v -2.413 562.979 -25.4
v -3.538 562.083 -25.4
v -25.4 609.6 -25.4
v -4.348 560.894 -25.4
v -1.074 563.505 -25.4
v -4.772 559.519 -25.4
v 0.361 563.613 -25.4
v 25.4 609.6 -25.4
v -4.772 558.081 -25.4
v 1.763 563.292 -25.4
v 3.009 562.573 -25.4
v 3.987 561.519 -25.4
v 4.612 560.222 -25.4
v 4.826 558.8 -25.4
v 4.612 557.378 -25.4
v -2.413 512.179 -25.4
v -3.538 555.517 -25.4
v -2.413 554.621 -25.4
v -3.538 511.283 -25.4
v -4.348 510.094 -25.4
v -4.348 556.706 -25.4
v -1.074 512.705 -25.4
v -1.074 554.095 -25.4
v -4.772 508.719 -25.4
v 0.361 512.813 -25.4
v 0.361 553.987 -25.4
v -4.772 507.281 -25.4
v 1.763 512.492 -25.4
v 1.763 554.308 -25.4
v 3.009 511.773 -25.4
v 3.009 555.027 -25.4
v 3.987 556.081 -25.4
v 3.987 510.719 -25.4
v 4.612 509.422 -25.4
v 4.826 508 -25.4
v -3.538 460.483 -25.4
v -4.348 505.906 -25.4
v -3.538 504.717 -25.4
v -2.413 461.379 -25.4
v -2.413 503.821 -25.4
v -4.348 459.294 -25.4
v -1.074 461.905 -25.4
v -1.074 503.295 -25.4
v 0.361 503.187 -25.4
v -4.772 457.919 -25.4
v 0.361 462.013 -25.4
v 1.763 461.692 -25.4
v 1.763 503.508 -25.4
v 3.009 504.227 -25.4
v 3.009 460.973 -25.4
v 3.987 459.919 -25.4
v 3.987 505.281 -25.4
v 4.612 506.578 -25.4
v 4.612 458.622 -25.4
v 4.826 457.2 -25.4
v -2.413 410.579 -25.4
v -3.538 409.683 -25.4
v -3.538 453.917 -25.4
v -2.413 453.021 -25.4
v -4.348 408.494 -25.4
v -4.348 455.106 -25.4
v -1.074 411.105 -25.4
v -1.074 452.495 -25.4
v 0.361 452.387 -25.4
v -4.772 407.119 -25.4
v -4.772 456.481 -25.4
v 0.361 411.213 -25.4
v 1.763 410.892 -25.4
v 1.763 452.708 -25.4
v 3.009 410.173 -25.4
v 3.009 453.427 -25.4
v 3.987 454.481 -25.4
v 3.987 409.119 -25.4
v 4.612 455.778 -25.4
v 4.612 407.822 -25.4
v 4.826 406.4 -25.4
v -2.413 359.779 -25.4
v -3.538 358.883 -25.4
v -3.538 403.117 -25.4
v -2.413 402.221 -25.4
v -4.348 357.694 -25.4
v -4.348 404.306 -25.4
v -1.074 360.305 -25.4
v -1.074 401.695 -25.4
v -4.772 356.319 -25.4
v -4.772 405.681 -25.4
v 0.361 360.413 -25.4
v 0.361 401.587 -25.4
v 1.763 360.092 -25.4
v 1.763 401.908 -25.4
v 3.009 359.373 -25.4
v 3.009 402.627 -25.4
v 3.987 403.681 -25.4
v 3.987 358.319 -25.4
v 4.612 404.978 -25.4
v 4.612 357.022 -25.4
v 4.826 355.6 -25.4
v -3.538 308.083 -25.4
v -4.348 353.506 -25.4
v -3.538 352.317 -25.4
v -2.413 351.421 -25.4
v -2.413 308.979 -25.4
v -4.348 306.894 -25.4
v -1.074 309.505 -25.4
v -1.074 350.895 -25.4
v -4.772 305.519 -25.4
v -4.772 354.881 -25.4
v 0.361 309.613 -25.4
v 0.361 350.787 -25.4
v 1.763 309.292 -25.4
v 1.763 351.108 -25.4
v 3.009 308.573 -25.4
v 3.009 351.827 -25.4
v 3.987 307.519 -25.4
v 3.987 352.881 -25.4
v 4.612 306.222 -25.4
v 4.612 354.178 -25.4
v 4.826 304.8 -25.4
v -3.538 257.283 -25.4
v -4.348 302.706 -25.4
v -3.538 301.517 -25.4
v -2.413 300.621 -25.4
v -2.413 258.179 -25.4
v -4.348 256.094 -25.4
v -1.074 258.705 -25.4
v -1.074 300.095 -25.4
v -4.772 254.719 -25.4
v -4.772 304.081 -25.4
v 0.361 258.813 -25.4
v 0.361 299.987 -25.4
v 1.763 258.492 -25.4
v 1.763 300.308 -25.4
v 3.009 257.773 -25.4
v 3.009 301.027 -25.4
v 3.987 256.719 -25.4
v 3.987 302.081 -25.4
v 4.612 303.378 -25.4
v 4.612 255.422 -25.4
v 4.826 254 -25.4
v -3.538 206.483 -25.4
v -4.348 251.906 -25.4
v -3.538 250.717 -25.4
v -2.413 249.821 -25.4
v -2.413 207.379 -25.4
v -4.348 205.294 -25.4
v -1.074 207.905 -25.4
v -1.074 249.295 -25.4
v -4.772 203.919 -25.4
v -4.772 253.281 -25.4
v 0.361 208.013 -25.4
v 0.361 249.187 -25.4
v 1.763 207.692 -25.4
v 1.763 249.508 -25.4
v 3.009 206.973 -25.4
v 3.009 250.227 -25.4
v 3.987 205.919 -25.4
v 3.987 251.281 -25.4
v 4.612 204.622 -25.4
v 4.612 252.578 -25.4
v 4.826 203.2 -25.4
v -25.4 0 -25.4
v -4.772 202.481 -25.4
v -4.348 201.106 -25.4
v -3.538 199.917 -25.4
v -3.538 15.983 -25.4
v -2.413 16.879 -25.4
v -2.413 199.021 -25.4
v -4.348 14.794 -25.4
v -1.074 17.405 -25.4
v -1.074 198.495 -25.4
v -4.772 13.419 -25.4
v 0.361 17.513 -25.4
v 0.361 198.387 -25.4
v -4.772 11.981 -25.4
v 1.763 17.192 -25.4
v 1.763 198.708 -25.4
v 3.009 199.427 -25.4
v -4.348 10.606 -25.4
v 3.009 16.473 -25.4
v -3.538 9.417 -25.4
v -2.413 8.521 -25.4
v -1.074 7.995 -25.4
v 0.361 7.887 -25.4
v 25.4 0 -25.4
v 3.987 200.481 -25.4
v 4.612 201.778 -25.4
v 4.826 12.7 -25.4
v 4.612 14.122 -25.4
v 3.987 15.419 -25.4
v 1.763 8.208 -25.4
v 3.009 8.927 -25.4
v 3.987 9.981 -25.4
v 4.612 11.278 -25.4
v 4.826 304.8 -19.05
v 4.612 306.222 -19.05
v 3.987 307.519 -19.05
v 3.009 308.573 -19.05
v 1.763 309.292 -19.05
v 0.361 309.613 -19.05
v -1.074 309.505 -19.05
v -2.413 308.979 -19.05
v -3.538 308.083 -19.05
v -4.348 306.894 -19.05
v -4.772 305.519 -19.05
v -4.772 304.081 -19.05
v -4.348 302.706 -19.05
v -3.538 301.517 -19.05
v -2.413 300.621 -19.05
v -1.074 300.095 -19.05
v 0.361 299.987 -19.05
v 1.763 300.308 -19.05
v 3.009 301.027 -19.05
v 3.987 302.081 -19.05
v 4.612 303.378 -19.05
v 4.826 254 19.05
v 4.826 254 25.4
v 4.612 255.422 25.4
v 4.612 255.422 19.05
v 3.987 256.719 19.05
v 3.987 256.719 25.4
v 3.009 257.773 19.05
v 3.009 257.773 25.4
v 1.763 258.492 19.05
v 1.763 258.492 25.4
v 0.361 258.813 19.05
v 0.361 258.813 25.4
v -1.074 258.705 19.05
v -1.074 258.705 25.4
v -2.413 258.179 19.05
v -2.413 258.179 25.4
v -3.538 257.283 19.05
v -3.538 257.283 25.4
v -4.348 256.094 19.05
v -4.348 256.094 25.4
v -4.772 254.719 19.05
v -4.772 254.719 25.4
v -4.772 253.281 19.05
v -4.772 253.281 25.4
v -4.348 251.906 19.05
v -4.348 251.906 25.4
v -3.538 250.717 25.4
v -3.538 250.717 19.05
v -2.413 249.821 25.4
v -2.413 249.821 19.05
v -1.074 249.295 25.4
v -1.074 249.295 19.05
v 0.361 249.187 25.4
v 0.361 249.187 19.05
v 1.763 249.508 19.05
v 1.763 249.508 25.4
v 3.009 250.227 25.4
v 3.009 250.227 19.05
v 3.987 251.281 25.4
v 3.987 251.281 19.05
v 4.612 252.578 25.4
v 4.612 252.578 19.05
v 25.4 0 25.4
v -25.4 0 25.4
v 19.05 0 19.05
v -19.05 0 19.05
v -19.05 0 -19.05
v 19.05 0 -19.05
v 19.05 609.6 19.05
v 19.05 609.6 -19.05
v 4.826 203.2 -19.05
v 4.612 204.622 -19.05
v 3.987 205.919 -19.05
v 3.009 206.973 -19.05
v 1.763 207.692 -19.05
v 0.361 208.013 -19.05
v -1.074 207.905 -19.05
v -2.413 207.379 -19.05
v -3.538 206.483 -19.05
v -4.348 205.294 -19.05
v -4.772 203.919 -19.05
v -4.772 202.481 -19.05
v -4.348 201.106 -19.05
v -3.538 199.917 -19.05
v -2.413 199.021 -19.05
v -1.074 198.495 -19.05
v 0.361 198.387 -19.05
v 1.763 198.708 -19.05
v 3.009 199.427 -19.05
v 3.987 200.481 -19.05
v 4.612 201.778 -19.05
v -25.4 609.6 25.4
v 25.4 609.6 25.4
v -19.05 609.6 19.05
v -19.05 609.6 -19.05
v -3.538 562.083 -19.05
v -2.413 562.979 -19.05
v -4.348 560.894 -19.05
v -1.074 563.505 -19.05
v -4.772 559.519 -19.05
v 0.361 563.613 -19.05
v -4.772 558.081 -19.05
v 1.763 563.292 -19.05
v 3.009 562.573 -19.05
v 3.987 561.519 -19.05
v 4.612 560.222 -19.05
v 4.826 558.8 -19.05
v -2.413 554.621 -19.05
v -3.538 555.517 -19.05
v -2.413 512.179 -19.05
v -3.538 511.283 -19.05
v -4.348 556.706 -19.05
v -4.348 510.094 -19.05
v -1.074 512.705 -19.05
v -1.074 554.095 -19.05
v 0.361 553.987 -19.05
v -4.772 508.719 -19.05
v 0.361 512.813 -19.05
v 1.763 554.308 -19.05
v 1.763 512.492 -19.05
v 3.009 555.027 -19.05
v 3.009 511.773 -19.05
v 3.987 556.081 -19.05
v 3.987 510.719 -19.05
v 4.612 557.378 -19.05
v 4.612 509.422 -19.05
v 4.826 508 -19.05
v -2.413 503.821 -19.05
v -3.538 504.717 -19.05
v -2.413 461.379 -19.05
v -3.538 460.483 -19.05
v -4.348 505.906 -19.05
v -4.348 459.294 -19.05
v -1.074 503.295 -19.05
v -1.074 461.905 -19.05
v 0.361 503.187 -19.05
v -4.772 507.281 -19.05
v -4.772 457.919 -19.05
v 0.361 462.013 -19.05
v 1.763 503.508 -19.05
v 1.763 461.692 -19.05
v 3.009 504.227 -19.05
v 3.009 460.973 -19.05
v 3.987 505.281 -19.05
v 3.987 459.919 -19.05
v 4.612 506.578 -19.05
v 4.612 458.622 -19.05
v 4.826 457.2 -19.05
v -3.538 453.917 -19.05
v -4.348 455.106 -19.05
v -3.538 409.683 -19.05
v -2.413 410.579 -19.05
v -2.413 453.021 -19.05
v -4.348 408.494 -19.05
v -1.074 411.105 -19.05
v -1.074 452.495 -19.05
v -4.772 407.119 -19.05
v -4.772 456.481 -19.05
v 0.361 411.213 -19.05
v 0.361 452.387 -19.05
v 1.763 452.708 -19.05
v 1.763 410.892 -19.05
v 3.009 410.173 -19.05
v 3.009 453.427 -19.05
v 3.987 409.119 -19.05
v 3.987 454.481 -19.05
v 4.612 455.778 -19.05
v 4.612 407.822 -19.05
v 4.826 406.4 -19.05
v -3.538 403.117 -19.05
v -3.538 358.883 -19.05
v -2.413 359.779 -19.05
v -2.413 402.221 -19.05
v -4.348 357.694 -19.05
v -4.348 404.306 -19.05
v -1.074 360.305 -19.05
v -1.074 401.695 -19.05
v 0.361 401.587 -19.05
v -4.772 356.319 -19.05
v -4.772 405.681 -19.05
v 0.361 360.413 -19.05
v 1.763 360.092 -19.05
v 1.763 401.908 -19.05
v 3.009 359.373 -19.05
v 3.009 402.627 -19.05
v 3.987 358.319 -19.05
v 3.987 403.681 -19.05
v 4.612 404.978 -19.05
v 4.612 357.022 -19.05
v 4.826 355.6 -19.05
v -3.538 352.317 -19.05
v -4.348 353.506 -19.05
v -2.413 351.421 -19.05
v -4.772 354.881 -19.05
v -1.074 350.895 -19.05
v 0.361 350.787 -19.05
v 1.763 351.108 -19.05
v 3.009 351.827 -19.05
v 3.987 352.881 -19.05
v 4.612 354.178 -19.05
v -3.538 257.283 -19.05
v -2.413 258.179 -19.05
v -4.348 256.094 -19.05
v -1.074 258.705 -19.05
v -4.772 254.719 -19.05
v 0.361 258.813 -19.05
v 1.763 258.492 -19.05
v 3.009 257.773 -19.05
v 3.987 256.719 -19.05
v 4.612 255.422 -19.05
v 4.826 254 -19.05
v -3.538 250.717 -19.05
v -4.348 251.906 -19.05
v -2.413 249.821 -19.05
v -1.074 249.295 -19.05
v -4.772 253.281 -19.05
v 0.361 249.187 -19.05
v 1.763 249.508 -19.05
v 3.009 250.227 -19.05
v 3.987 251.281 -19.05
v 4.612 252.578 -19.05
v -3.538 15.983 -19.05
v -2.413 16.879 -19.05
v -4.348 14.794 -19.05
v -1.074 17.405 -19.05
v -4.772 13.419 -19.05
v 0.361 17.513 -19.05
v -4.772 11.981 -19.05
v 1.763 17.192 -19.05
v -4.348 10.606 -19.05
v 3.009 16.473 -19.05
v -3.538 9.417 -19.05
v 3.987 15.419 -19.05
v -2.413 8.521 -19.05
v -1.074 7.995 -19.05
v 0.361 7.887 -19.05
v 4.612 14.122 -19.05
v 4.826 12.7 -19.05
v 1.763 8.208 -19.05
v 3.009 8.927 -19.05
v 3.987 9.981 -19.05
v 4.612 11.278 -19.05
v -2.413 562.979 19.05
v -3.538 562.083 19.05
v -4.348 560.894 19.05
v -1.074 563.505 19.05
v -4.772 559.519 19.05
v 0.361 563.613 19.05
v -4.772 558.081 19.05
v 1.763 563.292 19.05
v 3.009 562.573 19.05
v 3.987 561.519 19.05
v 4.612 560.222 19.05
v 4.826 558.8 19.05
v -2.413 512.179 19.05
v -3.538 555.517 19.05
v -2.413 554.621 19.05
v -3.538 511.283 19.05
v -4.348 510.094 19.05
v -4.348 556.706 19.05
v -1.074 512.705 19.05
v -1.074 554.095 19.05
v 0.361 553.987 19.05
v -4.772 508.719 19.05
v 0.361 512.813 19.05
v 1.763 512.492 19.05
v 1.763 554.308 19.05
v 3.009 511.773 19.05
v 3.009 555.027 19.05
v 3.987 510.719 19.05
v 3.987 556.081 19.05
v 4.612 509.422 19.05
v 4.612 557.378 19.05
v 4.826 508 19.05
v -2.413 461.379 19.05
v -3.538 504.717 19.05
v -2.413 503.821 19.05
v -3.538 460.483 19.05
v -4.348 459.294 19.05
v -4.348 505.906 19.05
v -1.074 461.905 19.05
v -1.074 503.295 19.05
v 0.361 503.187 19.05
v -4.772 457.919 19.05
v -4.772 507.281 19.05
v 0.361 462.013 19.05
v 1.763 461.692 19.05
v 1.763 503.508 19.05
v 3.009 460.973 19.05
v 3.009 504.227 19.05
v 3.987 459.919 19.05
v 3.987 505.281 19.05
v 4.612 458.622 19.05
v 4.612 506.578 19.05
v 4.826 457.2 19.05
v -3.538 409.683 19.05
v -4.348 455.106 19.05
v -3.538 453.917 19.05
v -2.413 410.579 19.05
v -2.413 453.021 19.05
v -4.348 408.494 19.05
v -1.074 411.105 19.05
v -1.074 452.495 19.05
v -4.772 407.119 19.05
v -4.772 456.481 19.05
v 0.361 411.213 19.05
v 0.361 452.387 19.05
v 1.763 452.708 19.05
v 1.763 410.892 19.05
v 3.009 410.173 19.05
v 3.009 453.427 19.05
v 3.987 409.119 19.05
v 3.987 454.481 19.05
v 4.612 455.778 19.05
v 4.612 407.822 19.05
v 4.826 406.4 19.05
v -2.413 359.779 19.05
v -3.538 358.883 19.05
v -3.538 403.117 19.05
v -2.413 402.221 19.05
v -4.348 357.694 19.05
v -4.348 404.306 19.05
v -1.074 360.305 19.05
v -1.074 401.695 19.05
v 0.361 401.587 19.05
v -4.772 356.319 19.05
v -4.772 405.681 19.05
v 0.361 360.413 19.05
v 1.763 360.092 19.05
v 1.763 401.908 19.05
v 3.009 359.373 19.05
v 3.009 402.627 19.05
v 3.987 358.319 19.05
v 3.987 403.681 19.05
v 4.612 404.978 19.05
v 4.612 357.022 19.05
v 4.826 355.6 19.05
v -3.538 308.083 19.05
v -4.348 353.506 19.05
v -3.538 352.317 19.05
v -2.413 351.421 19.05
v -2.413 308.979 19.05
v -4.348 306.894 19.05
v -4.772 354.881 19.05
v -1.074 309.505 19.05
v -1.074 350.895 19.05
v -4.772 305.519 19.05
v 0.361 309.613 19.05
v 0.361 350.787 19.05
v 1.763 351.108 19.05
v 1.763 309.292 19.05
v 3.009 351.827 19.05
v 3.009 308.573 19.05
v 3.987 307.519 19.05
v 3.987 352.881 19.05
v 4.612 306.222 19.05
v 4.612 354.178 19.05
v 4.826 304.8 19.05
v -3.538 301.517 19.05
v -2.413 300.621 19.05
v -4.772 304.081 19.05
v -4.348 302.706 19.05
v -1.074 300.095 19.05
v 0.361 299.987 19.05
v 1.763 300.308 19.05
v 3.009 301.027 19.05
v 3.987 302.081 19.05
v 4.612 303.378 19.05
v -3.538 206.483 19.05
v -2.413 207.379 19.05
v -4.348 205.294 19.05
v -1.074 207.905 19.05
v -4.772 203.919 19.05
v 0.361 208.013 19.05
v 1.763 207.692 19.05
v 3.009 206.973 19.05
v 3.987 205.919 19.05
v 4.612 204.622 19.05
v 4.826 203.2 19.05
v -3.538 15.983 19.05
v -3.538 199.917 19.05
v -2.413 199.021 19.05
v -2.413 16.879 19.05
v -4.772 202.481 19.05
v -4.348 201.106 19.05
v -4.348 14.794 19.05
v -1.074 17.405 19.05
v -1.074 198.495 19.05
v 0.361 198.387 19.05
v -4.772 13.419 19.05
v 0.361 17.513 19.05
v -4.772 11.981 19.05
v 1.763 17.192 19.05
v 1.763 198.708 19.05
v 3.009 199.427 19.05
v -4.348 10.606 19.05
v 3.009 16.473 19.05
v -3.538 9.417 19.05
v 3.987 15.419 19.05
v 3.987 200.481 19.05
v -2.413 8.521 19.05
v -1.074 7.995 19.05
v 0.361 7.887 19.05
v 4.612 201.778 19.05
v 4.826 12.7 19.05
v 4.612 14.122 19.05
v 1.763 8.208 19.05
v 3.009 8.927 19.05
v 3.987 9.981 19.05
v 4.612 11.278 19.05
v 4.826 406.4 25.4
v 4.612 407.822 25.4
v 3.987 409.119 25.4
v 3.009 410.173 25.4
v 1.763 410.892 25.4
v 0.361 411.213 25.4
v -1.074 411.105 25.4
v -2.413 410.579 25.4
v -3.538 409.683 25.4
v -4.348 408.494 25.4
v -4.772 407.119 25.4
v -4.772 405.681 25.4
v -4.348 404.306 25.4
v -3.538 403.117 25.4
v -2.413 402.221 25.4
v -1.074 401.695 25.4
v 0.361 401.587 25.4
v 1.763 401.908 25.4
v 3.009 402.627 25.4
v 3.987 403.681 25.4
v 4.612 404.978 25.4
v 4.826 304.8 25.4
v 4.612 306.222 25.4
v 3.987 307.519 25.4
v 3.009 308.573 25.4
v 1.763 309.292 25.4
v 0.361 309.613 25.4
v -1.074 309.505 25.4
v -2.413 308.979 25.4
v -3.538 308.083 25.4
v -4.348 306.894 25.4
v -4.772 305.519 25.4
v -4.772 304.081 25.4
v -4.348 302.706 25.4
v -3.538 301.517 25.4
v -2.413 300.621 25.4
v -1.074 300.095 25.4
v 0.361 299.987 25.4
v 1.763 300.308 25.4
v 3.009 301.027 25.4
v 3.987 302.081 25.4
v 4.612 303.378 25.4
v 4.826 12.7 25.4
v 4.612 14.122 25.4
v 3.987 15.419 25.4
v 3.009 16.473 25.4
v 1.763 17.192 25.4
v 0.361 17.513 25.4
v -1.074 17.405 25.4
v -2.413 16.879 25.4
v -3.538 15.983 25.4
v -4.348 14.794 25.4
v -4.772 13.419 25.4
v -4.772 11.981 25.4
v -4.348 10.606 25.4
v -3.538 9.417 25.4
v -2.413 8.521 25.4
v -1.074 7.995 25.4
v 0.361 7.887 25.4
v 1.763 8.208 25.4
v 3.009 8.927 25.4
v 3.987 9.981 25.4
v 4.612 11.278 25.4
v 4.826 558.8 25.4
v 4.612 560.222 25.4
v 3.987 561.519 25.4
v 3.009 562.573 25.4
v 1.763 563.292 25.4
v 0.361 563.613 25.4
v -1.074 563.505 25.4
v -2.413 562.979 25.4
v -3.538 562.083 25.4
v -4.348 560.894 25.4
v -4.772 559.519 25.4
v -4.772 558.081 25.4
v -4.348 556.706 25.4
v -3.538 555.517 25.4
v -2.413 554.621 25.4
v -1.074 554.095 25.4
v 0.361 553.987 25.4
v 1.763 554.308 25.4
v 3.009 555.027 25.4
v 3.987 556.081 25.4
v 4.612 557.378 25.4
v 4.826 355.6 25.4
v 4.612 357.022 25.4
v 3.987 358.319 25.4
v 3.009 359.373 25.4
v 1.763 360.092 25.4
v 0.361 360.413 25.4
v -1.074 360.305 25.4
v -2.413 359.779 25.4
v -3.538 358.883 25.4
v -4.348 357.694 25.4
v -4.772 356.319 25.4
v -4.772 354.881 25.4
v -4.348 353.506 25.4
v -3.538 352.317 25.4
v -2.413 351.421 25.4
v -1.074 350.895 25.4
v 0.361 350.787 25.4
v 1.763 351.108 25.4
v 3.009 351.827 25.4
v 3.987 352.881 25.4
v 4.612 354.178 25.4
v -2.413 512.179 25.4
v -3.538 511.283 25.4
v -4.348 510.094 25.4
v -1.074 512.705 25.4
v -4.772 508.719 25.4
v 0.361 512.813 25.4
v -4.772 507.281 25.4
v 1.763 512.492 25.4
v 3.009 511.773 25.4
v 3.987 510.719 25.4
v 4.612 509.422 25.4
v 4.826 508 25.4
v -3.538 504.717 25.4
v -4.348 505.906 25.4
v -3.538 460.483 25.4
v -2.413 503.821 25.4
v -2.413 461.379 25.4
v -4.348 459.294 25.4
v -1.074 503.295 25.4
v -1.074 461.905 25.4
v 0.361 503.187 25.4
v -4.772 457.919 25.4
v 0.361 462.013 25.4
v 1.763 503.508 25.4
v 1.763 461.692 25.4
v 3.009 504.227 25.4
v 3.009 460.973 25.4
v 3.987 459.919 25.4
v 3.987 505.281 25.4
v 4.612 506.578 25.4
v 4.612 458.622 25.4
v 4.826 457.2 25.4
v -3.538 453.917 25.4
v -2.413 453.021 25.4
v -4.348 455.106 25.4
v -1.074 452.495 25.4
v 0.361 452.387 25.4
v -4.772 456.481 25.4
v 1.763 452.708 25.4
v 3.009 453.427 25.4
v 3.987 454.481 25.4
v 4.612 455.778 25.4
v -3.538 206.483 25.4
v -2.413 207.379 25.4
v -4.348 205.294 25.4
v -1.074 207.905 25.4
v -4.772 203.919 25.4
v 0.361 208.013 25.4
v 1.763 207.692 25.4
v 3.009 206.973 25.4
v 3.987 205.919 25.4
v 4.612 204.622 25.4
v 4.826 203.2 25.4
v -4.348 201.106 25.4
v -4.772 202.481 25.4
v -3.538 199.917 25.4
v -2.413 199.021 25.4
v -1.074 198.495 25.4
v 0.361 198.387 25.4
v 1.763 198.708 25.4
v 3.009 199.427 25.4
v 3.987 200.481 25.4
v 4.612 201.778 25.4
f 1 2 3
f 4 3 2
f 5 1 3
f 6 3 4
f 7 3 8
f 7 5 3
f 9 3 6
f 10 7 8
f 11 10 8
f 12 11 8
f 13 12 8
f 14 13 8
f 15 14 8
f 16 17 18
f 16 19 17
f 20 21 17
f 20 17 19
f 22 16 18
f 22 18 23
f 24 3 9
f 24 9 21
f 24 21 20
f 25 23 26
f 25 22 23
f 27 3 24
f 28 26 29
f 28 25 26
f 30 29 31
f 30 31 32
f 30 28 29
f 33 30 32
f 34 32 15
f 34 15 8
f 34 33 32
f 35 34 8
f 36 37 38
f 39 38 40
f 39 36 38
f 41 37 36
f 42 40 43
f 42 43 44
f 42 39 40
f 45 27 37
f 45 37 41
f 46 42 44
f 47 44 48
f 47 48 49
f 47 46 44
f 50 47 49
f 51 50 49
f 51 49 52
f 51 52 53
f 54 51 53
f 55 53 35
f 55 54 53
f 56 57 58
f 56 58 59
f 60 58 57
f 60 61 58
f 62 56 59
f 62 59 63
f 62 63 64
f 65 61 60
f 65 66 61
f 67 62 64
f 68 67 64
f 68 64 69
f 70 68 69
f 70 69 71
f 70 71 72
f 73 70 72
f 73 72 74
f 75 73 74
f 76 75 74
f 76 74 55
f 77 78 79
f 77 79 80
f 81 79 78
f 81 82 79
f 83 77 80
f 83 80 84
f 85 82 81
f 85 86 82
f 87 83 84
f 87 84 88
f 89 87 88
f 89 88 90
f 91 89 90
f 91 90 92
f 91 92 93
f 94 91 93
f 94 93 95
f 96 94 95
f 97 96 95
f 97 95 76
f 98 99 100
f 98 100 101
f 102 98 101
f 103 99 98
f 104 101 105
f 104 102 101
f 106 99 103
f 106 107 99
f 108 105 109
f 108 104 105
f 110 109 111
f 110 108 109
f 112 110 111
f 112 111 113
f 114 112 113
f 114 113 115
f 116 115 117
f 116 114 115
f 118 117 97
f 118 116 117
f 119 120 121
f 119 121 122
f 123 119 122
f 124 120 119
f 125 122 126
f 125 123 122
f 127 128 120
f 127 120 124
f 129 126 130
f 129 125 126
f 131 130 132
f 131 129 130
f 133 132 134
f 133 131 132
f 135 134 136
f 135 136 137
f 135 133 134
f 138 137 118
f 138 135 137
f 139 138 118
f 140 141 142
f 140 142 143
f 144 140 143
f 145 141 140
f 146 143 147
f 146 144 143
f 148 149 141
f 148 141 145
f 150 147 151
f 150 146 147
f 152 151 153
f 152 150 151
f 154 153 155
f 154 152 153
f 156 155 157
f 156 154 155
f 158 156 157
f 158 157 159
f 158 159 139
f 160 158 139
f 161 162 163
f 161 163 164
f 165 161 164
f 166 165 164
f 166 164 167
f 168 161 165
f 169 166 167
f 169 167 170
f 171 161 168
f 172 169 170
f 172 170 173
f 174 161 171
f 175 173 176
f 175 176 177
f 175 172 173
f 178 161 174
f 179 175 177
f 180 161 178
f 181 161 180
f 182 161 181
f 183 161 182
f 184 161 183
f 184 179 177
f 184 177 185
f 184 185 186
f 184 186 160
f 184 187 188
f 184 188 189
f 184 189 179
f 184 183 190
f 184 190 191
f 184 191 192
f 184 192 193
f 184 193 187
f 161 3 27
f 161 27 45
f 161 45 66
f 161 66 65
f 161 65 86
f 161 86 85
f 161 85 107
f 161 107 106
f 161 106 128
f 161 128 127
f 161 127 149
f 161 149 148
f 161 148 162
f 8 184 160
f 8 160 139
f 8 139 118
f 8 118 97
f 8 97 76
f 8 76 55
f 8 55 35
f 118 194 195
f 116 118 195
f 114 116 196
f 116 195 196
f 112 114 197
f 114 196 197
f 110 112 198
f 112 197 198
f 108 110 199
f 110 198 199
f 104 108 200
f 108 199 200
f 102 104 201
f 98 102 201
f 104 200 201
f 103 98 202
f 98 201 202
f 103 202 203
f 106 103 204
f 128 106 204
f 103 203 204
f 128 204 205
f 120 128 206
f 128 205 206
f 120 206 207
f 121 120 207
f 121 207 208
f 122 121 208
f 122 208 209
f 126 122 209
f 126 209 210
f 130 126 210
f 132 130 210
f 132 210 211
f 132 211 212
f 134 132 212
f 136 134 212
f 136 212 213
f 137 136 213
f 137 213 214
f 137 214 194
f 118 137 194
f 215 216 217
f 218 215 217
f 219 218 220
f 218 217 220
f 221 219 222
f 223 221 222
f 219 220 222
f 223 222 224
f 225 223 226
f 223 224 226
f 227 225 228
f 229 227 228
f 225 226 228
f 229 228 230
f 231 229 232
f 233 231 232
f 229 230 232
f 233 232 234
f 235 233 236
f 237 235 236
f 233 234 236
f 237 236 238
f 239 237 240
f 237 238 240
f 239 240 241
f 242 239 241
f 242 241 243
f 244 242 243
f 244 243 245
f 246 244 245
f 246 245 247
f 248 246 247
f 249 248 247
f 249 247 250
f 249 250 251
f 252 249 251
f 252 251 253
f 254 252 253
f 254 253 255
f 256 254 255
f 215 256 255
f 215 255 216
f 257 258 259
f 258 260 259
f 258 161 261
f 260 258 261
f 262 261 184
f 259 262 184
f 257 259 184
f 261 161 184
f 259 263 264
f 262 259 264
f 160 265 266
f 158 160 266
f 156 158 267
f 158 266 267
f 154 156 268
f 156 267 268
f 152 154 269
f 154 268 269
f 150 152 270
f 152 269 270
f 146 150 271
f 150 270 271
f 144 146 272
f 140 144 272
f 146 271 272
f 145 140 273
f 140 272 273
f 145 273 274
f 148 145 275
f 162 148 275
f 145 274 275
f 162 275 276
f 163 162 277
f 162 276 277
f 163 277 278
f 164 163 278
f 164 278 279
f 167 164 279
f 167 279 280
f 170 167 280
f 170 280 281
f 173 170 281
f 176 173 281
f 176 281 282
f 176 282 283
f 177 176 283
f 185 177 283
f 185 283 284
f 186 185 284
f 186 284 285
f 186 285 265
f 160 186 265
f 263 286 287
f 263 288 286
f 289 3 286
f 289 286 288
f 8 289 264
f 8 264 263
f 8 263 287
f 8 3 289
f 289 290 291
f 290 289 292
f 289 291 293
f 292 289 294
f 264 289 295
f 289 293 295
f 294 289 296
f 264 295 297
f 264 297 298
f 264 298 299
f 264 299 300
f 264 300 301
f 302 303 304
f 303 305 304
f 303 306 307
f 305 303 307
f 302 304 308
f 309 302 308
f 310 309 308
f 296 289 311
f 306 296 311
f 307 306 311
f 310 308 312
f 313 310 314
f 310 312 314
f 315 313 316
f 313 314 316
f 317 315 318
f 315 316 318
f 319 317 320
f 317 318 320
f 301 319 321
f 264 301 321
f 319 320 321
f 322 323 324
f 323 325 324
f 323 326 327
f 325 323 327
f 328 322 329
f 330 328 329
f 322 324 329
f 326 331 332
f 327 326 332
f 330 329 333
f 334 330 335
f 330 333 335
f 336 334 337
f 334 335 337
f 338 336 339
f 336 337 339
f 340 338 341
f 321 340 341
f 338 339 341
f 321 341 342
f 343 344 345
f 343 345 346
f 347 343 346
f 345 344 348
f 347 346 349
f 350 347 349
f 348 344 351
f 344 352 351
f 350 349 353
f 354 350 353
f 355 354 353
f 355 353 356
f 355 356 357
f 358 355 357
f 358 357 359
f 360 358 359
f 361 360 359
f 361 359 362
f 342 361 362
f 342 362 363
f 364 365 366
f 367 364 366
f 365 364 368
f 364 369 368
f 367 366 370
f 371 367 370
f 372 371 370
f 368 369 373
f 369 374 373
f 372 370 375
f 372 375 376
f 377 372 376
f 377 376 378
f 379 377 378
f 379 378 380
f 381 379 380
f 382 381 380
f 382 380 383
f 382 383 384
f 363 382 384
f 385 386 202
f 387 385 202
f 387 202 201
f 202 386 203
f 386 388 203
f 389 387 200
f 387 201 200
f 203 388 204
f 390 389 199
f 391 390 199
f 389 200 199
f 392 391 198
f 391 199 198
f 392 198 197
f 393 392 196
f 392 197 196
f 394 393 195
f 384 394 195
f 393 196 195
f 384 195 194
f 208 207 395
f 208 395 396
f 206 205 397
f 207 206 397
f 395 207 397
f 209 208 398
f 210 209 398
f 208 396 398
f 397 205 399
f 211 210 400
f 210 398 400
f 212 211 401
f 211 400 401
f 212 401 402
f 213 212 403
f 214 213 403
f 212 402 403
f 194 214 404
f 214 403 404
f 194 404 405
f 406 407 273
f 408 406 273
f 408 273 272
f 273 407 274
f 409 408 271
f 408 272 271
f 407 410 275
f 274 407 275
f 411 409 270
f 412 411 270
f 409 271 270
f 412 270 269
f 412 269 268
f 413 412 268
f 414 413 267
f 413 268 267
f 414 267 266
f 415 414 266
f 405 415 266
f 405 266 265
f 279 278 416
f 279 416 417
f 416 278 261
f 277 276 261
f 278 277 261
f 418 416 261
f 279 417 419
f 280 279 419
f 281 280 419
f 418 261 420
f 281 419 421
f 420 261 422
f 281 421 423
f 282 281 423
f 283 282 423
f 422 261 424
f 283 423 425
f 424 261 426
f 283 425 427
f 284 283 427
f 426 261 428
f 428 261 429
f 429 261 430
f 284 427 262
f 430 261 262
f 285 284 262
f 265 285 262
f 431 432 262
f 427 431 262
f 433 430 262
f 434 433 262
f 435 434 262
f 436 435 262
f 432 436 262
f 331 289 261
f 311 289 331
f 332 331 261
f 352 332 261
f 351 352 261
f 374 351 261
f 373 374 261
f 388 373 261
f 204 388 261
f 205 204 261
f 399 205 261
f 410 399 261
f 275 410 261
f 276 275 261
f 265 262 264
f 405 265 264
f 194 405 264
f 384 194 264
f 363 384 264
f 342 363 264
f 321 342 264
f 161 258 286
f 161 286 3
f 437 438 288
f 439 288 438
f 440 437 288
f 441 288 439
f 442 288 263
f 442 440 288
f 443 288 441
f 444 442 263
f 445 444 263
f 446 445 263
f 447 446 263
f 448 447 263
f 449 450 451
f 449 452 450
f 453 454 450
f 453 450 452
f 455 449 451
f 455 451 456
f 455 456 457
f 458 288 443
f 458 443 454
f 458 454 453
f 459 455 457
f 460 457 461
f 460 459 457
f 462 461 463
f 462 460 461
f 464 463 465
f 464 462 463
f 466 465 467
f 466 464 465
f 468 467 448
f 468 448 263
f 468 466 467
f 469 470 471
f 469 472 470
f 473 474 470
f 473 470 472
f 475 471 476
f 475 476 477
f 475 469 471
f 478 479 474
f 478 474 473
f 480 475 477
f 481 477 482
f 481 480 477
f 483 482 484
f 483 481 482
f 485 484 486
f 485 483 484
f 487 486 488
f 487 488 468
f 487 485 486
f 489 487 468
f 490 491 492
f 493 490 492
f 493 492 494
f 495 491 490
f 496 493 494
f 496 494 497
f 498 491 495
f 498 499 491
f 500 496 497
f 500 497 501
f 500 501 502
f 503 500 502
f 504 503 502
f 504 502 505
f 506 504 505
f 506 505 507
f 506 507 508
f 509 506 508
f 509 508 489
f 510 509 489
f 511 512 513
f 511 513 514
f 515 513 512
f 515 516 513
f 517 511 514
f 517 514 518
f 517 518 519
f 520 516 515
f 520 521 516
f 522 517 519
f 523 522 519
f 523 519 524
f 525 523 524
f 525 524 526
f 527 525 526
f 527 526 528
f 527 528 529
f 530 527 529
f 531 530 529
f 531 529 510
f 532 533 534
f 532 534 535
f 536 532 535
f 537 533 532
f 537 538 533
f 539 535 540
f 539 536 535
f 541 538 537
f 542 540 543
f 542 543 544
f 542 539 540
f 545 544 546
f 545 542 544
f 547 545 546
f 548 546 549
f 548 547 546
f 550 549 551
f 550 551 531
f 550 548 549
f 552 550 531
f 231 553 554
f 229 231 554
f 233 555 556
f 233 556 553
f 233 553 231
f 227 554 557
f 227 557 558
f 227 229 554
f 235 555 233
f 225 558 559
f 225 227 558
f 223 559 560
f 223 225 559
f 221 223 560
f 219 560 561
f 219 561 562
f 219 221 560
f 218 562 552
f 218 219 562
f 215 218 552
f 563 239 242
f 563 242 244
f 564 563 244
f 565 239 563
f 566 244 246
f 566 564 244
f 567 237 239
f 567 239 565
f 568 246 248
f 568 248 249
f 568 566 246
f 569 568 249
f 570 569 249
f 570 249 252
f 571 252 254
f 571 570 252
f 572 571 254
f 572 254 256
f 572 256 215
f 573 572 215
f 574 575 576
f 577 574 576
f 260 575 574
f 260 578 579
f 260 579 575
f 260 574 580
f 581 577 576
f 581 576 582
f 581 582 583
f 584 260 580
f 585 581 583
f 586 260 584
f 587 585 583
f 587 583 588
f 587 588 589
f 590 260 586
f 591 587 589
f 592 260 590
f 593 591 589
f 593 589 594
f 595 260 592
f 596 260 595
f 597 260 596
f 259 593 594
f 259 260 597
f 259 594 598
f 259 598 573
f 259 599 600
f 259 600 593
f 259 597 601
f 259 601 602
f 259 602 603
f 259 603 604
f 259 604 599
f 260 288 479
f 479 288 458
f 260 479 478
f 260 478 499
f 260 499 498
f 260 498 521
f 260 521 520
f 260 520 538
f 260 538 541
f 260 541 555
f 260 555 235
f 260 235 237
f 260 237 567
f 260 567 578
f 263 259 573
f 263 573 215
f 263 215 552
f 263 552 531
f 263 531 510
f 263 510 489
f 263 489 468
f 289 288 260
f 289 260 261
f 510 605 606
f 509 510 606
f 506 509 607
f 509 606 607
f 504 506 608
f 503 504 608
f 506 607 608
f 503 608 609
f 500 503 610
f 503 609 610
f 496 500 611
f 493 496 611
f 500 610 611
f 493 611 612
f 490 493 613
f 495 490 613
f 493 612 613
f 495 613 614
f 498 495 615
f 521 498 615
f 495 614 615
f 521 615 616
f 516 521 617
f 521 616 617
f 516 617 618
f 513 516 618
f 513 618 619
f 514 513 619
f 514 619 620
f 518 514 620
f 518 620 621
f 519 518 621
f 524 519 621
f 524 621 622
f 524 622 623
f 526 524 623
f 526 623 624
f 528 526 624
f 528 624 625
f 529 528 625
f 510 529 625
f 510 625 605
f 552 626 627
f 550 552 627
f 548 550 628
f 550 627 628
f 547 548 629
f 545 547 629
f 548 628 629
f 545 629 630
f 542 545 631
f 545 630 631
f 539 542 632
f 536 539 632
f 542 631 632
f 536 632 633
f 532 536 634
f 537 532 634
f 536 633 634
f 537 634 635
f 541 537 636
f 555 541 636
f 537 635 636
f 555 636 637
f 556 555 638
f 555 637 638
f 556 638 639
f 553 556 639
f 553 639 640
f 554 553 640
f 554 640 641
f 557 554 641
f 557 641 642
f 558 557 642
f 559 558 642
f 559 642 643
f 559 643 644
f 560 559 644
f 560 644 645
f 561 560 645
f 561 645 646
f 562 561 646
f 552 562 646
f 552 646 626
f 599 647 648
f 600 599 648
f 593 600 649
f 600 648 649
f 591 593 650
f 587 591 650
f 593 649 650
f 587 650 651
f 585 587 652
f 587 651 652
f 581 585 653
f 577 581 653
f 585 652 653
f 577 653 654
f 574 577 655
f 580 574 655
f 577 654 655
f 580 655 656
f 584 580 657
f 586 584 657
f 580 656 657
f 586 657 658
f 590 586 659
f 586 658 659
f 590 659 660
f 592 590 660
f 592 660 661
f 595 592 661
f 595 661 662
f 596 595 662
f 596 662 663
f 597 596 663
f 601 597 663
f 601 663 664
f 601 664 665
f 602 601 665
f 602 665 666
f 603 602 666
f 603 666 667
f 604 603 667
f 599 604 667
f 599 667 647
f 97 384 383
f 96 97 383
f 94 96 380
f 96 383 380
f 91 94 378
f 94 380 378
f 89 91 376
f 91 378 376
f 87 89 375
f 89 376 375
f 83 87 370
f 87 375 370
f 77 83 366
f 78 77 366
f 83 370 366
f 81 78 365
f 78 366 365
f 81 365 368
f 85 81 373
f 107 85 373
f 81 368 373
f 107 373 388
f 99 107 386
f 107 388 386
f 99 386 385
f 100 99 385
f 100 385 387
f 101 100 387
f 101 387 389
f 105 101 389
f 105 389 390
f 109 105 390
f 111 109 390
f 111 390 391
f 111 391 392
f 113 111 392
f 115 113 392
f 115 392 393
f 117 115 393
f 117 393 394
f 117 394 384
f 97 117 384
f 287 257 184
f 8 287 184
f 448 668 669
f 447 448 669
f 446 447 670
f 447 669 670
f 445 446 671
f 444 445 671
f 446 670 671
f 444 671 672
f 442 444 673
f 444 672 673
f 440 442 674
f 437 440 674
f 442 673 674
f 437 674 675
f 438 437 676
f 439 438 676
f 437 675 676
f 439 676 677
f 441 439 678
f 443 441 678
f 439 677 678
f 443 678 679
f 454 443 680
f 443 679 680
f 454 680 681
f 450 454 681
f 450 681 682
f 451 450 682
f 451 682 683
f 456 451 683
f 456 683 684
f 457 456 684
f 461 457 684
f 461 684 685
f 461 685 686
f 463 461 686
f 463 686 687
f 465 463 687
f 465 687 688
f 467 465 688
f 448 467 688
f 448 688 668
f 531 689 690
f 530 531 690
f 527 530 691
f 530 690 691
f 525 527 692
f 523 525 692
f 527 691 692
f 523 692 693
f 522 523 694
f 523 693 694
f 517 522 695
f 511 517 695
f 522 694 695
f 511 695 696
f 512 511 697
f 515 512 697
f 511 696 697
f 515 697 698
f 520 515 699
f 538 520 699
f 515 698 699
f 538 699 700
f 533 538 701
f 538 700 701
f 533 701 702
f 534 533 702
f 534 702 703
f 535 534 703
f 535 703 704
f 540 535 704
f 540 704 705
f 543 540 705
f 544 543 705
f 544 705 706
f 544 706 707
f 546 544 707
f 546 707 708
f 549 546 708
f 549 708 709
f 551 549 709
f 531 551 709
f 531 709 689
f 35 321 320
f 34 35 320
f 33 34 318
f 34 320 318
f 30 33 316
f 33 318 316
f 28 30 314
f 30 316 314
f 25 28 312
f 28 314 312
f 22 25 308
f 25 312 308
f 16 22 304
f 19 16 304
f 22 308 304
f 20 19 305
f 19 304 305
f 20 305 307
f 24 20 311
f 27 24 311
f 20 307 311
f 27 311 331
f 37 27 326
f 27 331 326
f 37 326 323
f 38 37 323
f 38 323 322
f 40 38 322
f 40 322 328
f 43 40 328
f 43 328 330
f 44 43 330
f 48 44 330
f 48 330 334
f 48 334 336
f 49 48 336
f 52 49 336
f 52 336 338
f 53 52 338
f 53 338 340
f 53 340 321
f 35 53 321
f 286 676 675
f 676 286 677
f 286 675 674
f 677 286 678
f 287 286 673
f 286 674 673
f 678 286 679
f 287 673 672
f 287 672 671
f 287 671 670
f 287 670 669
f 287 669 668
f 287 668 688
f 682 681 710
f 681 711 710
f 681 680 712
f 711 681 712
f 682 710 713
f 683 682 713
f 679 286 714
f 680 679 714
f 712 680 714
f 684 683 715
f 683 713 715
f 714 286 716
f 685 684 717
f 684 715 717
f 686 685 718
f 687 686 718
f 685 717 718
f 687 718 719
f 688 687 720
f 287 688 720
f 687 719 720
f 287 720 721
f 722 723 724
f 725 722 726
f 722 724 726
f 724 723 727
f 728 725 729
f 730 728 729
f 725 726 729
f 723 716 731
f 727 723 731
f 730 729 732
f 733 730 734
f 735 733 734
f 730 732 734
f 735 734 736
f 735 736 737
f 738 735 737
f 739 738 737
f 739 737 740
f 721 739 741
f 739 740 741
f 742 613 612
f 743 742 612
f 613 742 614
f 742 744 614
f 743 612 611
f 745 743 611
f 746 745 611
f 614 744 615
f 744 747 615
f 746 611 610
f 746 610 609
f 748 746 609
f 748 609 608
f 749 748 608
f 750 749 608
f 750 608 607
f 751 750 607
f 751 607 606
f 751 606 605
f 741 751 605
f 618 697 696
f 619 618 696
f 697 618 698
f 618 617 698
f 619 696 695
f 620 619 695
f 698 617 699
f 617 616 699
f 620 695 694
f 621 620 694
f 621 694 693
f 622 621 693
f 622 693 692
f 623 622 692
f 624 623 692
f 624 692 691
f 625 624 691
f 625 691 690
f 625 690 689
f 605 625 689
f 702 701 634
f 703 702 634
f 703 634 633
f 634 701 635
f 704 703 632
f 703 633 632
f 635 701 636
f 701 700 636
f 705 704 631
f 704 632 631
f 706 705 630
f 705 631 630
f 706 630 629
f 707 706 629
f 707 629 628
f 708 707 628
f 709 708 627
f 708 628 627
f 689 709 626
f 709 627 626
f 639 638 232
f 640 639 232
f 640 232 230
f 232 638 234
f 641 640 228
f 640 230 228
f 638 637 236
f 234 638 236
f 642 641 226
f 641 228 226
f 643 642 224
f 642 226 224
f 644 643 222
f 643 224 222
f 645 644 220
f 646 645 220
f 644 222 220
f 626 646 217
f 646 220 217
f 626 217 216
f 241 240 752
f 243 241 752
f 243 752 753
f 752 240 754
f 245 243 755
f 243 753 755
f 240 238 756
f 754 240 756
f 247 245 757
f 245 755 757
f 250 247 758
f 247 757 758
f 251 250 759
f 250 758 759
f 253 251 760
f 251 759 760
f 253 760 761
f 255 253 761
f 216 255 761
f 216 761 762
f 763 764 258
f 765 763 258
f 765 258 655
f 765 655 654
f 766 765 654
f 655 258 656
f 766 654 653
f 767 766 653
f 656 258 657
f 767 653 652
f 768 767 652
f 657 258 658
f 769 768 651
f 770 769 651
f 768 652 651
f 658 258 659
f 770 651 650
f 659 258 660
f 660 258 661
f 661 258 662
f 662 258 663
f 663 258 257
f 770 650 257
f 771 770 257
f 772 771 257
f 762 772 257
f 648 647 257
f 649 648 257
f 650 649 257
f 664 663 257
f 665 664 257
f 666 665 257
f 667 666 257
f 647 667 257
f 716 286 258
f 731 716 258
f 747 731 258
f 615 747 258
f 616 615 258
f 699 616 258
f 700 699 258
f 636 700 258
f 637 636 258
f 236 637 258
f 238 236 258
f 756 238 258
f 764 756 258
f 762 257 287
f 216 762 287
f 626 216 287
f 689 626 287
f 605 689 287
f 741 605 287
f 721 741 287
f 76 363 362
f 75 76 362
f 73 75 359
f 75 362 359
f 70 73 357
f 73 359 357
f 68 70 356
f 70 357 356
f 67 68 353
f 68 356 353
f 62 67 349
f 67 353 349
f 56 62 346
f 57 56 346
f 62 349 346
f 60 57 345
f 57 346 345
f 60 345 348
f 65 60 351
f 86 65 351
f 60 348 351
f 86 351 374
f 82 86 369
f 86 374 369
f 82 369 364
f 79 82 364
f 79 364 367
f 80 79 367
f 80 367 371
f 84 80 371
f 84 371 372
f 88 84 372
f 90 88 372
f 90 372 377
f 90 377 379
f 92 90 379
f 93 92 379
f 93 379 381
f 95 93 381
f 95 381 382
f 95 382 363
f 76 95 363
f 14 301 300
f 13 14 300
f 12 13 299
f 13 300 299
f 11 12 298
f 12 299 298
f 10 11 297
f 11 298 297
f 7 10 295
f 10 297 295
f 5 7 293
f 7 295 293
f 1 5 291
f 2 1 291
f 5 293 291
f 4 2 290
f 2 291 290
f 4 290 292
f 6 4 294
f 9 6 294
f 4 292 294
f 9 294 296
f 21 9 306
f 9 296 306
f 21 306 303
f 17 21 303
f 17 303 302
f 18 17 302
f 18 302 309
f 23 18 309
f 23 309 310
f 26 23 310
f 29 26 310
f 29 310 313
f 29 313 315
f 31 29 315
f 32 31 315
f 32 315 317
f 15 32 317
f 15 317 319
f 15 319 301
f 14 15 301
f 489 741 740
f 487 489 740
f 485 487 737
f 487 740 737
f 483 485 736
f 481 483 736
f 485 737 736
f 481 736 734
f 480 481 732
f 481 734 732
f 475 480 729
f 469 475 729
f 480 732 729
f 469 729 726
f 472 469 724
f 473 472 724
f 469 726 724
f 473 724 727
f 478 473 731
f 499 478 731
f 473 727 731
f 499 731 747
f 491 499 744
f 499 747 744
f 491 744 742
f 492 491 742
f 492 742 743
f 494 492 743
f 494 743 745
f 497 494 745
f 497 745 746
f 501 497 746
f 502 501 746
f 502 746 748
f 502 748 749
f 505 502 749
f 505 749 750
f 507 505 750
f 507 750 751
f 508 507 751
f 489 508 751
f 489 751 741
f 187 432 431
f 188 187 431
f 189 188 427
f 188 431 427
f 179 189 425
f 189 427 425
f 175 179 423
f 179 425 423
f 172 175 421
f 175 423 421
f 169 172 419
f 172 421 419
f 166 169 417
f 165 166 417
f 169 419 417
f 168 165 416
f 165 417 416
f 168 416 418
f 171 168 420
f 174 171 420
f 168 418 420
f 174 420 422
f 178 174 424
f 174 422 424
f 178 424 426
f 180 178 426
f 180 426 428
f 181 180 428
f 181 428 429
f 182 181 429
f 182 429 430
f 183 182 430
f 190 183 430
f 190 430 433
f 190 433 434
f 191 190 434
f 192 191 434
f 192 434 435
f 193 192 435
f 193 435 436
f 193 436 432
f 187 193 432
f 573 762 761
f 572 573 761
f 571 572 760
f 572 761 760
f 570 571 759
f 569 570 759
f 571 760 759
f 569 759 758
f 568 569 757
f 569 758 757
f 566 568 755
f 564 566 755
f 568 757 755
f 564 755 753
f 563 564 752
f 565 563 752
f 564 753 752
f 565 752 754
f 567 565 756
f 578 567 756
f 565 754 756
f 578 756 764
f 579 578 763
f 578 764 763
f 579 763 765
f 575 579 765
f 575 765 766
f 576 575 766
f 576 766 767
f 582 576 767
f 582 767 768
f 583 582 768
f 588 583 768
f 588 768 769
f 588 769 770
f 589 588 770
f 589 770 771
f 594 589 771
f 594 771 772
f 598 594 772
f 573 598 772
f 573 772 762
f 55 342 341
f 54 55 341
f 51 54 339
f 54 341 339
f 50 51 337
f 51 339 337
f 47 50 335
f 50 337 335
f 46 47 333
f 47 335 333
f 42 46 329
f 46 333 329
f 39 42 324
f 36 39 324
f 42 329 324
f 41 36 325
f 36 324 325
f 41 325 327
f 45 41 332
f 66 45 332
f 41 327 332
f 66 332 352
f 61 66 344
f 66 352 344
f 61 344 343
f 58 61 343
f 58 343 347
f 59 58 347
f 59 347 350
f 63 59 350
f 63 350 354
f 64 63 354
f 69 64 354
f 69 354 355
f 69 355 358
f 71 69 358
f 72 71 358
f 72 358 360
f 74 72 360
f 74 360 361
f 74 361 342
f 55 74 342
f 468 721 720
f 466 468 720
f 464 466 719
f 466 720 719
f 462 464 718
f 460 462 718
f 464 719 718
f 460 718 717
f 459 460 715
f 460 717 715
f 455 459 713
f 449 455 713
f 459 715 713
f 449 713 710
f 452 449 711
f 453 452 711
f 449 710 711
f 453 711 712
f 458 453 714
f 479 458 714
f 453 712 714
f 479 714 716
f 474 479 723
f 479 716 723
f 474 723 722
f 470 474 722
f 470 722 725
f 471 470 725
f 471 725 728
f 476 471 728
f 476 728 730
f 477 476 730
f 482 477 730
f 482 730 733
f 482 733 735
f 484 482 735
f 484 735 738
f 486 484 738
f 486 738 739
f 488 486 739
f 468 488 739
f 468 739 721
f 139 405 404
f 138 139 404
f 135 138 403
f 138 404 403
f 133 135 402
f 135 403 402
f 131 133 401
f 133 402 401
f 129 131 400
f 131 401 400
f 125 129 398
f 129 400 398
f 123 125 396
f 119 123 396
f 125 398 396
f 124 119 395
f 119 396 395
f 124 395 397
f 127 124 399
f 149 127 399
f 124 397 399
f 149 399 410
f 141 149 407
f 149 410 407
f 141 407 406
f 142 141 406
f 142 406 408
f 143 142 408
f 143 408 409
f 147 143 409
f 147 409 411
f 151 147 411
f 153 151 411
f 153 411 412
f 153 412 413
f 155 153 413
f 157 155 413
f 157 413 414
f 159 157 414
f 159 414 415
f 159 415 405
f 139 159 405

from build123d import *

# Parameters (mm, degrees)
SKETCH2_W           = 50.8
SKETCH2_H           = 50.8
SKETCH2_W_2         = 38.1
SKETCH2_H_2         = 38.1
BOSS_EXTRUDE1_DEPTH = 609.6
SKETCH3_R           = 4.826
CUT_EXTRUDE1_DEPTH  = 609.6


with BuildPart() as part:
    # Sketch2 → Boss-Extrude1 (new body)
    with BuildSketch(Plane(origin=(0, 0, 0), x_dir=(1, 0, 0), z_dir=(0, 1, 0))):
        Rectangle(SKETCH2_W, SKETCH2_H)
        Rectangle(SKETCH2_W_2, SKETCH2_H_2, mode=Mode.SUBTRACT)
    extrude(amount=BOSS_EXTRUDE1_DEPTH)

    # Sketch3 → Cut-Extrude1 (cut)
    with BuildSketch(Plane.XY.offset(25.4)):
        with Locations((0, 12.7)):
            Circle(SKETCH3_R)
        with Locations((0, 558.8)):
            Circle(SKETCH3_R)
        with Locations((0, 508)):
            Circle(SKETCH3_R)
        with Locations((0, 457.2)):
            Circle(SKETCH3_R)
        with Locations((0, 406.4)):
            Circle(SKETCH3_R)
        with Locations((0, 355.6)):
            Circle(SKETCH3_R)
        with Locations((0, 304.8)):
            Circle(SKETCH3_R)
        with Locations((0, 254)):
            Circle(SKETCH3_R)
        with Locations((0, 203.2)):
            Circle(SKETCH3_R)
    extrude(amount=-CUT_EXTRUDE1_DEPTH, mode=Mode.SUBTRACT)


solid = part.part
